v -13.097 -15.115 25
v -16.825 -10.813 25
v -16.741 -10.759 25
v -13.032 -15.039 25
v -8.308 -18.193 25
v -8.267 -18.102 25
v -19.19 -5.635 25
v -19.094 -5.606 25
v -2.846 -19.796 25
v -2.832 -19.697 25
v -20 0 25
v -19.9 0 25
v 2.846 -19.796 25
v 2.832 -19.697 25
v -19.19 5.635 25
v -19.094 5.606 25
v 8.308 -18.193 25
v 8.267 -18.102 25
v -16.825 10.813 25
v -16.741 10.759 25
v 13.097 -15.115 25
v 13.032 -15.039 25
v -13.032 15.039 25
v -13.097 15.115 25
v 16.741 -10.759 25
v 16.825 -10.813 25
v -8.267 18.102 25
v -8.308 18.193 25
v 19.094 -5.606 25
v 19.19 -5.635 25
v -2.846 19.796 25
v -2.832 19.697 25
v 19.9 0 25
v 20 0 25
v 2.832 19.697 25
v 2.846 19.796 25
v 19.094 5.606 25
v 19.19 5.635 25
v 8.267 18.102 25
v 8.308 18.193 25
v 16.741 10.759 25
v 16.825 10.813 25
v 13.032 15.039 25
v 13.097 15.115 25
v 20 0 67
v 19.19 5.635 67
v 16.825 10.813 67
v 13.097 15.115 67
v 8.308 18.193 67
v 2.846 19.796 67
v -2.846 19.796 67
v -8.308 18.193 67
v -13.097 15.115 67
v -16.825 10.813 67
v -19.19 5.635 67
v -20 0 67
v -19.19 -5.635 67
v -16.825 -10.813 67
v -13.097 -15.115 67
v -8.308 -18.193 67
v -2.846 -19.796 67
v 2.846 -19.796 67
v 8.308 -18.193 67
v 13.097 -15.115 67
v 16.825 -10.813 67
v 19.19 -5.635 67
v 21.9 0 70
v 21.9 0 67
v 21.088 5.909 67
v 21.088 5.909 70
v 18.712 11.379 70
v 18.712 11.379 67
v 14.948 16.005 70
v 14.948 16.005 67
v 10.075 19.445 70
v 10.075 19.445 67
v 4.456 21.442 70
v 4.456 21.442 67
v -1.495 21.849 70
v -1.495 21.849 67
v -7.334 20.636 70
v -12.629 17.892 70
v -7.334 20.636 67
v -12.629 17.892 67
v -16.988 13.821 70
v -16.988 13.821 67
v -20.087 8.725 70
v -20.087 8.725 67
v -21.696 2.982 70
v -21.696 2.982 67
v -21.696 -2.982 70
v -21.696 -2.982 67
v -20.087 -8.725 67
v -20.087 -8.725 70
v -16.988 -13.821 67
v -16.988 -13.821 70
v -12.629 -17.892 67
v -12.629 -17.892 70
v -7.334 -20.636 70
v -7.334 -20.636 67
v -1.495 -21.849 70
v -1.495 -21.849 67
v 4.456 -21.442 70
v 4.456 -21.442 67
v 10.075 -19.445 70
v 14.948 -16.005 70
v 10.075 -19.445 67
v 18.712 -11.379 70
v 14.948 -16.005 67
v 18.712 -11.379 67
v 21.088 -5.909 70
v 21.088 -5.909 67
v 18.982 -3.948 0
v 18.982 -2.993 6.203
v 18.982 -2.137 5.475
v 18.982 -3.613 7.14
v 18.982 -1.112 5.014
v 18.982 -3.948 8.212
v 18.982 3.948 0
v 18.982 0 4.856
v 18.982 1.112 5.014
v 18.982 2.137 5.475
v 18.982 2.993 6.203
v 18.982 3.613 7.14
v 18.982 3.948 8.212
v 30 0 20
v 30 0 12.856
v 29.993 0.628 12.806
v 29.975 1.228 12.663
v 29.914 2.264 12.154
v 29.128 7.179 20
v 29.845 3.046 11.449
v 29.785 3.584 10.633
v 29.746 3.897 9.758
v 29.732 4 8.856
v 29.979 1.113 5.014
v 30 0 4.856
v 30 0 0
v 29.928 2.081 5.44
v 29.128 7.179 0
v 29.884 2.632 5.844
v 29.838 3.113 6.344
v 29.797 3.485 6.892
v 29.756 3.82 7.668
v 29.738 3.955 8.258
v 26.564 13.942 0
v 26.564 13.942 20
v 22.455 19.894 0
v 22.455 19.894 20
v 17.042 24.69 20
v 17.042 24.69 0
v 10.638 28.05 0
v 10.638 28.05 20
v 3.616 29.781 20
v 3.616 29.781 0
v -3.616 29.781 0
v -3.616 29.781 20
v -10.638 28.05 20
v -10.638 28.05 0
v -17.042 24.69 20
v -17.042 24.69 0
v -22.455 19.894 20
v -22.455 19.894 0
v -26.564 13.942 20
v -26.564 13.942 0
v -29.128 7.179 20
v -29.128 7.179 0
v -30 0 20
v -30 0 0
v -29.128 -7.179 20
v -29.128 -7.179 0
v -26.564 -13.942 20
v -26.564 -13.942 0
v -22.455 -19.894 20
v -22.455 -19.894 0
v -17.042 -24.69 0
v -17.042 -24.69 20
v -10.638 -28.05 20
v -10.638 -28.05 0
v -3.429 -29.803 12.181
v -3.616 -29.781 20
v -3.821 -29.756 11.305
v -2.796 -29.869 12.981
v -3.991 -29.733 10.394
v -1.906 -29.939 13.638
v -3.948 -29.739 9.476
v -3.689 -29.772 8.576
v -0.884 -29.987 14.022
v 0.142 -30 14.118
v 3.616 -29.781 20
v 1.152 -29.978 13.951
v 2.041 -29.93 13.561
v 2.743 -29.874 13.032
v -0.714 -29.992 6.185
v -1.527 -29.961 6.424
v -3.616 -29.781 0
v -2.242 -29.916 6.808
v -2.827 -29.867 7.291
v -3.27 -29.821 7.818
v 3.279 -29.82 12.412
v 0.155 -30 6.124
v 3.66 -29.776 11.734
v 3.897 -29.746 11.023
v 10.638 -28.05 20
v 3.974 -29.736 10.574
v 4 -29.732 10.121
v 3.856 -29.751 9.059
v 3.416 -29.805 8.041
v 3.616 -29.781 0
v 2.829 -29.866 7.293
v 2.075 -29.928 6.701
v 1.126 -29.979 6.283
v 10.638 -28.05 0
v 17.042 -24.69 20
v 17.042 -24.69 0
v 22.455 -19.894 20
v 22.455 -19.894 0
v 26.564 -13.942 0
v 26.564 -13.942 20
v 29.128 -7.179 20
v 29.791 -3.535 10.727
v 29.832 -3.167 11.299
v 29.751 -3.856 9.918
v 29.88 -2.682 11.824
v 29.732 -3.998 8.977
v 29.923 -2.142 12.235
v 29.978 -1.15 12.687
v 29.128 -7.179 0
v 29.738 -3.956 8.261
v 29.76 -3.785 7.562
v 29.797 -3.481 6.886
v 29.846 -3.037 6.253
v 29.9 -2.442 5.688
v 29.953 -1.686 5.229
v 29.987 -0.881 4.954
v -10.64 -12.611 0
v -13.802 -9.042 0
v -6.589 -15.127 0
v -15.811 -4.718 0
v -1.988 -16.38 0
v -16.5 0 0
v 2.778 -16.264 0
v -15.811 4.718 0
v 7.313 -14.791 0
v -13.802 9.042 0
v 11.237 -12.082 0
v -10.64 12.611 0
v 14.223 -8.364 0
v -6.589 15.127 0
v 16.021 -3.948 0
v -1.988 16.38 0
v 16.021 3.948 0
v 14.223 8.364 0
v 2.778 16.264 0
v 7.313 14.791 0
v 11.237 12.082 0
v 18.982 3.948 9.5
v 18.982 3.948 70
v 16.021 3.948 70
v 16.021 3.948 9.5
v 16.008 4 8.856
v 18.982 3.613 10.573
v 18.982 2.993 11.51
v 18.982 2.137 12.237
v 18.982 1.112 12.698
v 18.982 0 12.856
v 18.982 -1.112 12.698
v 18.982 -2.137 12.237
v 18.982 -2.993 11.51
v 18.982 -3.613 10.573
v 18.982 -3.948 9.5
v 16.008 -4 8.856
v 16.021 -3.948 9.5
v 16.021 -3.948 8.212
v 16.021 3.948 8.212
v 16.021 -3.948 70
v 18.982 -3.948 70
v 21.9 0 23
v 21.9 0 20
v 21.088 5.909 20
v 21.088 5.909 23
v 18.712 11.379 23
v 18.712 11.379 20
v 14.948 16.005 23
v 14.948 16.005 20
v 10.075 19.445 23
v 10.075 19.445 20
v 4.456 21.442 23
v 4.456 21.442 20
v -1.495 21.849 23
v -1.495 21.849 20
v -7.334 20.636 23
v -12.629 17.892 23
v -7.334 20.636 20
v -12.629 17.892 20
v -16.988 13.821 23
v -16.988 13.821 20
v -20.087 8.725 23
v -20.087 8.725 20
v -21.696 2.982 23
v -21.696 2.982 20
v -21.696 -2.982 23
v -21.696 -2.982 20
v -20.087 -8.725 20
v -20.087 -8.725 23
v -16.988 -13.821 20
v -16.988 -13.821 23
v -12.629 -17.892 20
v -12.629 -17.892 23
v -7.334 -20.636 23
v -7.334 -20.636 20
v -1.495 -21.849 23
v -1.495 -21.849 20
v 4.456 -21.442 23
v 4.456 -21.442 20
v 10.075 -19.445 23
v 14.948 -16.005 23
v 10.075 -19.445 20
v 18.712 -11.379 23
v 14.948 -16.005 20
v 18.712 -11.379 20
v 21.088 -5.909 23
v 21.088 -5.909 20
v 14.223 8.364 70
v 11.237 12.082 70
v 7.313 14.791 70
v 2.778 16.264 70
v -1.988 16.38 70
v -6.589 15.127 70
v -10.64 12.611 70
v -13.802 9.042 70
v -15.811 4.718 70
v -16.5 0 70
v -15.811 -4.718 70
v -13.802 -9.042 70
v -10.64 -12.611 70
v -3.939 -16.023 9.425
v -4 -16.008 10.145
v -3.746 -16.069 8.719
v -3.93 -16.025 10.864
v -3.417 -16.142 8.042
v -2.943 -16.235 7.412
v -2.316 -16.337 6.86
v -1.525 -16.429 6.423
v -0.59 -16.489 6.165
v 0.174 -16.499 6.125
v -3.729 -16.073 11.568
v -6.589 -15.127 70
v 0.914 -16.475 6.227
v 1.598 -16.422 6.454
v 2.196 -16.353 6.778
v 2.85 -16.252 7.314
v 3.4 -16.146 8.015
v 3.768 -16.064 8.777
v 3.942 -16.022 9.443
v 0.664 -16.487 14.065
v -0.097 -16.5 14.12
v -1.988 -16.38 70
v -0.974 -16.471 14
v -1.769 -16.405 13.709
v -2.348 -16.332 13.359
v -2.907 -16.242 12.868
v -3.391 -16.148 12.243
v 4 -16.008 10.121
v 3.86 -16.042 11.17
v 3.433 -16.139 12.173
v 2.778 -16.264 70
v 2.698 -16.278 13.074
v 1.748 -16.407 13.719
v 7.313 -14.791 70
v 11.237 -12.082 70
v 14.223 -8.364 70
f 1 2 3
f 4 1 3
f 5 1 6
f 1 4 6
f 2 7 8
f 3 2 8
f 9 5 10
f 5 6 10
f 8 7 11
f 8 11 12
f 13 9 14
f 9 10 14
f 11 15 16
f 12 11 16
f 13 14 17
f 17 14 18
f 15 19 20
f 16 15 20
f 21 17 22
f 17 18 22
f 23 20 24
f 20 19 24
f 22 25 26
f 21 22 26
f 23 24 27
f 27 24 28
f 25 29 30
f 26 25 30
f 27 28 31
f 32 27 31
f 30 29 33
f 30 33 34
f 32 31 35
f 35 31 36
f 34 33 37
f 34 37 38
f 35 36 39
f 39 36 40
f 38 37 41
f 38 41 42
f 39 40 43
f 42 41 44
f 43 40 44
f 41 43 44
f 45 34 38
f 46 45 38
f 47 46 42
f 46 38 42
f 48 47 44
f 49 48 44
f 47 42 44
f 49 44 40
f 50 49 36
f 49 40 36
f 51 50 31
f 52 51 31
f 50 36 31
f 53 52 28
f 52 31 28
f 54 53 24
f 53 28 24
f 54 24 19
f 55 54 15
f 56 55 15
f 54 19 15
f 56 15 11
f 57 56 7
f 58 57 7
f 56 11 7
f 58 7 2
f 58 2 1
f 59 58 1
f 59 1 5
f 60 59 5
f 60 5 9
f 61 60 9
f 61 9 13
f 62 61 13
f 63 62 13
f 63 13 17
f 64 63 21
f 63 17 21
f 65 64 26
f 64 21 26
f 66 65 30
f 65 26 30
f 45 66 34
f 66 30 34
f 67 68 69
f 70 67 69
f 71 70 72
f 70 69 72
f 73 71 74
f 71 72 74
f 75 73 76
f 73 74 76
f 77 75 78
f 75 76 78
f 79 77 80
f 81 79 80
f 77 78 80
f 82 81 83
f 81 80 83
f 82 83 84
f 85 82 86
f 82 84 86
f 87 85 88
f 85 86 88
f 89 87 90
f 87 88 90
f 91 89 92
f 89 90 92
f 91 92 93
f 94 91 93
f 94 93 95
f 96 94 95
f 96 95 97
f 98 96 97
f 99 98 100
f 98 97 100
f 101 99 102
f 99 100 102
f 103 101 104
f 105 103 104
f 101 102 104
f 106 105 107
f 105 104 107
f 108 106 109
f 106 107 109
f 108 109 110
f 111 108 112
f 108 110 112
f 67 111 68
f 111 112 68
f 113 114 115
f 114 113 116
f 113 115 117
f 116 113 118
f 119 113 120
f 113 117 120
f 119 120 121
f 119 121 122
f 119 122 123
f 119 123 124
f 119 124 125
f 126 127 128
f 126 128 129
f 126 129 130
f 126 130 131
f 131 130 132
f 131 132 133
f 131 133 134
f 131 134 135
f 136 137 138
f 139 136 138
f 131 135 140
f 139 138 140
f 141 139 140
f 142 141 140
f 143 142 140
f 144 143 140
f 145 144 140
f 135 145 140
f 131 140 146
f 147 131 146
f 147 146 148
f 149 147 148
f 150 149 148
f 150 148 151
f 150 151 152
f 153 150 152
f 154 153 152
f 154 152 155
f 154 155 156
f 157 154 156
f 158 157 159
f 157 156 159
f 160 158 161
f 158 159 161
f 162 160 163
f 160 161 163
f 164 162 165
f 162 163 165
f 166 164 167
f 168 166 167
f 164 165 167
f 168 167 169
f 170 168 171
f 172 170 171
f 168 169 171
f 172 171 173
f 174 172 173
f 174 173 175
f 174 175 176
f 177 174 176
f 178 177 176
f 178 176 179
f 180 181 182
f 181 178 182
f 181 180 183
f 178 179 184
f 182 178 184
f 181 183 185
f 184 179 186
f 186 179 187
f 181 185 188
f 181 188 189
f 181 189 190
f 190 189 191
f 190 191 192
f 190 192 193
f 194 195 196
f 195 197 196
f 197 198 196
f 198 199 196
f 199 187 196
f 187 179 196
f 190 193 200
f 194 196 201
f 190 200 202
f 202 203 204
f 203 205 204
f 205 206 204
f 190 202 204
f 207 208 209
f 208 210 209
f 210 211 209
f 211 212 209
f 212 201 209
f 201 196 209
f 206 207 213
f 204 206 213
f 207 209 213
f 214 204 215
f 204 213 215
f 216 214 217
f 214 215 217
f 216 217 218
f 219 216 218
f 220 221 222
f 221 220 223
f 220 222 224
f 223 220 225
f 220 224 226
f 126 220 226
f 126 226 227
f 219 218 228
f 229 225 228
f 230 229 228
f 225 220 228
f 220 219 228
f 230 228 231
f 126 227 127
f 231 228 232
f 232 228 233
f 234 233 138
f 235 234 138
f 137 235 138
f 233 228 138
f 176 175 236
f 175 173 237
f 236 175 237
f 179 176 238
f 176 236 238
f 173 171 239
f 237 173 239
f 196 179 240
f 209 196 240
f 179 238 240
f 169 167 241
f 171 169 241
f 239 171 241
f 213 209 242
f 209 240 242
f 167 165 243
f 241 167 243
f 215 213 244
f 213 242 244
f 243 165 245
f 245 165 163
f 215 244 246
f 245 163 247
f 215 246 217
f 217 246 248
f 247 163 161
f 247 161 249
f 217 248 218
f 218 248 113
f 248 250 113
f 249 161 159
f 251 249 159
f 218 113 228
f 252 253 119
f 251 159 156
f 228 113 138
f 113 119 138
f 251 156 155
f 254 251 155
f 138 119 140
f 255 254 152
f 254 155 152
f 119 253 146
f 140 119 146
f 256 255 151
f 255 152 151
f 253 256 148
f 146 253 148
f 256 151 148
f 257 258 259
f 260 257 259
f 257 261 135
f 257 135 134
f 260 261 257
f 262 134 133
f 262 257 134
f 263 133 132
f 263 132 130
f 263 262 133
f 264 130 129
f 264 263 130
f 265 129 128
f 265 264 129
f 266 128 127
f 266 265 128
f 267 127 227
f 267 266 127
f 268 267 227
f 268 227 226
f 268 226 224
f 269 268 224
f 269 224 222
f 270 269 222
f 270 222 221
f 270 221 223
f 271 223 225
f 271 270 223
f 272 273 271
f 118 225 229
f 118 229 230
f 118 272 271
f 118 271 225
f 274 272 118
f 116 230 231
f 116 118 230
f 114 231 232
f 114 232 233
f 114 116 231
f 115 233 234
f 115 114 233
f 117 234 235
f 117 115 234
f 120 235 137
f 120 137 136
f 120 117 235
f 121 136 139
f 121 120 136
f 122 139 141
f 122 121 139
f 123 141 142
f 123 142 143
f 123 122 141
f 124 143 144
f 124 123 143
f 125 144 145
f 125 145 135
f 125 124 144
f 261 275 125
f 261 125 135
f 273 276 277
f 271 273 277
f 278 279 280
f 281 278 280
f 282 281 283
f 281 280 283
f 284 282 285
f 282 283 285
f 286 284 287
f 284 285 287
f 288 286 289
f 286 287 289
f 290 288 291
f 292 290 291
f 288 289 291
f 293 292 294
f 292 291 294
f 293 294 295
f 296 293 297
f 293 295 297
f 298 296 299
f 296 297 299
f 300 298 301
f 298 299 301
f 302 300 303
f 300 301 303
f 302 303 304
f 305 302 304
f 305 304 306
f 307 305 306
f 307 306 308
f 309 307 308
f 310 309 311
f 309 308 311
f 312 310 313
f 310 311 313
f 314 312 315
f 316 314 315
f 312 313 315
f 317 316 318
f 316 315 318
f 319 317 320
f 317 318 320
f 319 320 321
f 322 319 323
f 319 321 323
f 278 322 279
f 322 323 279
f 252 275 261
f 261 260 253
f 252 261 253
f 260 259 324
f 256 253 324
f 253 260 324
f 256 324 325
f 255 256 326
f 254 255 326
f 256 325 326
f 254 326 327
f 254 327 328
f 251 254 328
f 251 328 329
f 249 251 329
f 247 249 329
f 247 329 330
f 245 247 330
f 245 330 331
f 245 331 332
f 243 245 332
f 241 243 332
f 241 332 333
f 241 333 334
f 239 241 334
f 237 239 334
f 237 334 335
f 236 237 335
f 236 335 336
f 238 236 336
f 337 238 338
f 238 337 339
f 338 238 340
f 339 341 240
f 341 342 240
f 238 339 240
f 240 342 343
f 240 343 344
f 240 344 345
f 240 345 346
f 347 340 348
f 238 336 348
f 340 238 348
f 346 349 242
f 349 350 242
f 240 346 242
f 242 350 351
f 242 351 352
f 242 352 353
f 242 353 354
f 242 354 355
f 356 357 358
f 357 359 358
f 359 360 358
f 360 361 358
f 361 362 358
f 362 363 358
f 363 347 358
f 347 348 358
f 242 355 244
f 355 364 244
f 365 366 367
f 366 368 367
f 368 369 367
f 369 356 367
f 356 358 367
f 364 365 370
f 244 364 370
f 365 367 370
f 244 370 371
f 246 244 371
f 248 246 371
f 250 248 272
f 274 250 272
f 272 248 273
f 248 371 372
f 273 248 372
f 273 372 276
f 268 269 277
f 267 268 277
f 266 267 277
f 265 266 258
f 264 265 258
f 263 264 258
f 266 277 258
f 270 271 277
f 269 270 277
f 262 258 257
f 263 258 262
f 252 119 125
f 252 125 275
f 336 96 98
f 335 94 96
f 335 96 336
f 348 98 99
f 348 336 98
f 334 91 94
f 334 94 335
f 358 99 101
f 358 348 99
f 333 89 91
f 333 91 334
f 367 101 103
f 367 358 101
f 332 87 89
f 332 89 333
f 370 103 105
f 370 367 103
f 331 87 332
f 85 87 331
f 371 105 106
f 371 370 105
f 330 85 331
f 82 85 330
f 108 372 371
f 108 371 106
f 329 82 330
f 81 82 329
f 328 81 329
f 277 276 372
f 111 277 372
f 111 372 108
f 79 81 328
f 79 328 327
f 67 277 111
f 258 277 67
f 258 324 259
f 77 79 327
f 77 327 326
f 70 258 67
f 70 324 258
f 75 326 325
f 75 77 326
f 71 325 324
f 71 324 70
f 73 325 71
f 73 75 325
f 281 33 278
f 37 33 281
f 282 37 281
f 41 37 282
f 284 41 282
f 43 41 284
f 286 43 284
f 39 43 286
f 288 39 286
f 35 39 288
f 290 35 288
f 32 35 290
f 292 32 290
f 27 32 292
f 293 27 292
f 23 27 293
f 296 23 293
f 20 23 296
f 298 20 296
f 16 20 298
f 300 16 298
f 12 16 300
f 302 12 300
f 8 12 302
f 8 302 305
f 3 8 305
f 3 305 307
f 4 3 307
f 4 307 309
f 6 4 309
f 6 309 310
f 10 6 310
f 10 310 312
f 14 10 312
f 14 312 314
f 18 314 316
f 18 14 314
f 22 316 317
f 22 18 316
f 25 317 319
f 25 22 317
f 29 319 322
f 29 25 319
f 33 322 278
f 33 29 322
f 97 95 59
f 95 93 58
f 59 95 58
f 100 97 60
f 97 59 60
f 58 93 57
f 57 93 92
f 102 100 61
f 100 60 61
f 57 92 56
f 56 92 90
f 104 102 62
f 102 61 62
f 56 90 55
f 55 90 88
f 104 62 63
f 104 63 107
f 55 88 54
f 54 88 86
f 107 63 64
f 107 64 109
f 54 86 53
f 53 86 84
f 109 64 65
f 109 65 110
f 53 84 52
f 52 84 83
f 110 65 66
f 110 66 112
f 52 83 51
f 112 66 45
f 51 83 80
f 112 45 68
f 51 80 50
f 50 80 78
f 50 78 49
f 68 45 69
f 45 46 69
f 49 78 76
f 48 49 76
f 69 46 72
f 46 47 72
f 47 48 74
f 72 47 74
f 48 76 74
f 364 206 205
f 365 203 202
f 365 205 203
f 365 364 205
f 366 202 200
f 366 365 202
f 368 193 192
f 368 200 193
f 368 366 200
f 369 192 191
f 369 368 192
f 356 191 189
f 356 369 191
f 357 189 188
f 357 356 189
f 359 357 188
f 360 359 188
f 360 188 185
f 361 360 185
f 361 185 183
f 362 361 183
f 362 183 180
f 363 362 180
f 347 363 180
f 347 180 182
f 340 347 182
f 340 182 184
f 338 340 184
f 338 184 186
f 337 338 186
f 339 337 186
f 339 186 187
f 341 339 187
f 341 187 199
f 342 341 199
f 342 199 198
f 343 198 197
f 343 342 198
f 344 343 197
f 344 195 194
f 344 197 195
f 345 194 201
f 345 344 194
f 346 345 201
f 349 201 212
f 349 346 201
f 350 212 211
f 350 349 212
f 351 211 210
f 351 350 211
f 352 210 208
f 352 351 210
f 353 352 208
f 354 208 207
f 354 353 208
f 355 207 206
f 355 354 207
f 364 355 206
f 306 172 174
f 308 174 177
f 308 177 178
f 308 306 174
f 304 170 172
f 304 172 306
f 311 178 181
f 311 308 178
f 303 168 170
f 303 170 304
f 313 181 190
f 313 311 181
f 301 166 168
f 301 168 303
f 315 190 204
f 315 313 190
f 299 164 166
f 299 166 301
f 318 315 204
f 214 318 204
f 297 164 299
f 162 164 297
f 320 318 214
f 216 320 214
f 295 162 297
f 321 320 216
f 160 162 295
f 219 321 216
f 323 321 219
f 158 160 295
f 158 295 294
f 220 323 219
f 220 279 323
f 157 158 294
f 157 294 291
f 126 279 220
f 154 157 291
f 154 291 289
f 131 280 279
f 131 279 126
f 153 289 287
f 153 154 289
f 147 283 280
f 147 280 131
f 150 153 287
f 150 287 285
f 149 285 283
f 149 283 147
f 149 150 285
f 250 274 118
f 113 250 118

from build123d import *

# Parameters (mm, degrees)
F0_R      = 30
F1_DEPTH  = 20
F2_R      = 4
F3_DEPTH  = 30
F4_R      = 21.9
F5_DEPTH  = 5
F6_SIZE   = 2
F7_R      = 20
F7_R_2    = 19.9
F8_DEPTH  = 42
F9_R      = 21.9
F9_R_2    = 20
F10_DEPTH = 3
F12_DEPTH = 70
F13_R     = 4
F14_DEPTH = 30.0010001


with BuildPart() as f1:
    # F0 (on Top) → F1 (new body)
    with BuildSketch(Plane.XY):
        Circle(F0_R)
    extrude(amount=F1_DEPTH)

    # F2 (on Front) → F3 (cut)
    with BuildSketch(Plane.XZ):
        with Locations((0, 10.1209855556)):
            Circle(F2_R)
    extrude(amount=F3_DEPTH, mode=Mode.SUBTRACT)

    # F4 (on face) → F5 (join)
    with BuildSketch(Plane.XY.offset(20)):
        Circle(F4_R)
    extrude(amount=F5_DEPTH)

    # F6
    f6_edges = [f1.edges().sort_by_distance(p)[0] for p in [
        (-21.9, 0, 25),
    ]]
    chamfer(f6_edges, length=F6_SIZE)

    # F7 (on face) → F8 (join)
    with BuildSketch(Plane.XY.offset(25)):
        Circle(F7_R)
        Circle(F7_R_2, mode=Mode.SUBTRACT)
        Circle(F7_R_2)
    extrude(amount=F8_DEPTH)

    # F9 (on face) → F10 (join)
    with BuildSketch(Plane.XY.offset(67)):
        Circle(F9_R)
        Circle(F9_R_2, mode=Mode.SUBTRACT)
        Circle(F9_R_2)
    extrude(amount=F10_DEPTH)

    # F11 (on face) → F12 (cut)
    with BuildSketch(Plane.XY.offset(70)):
        with BuildLine():
            Line((18.9816207227, 3.9478135966), (16.0207605252, 3.9478135966))
            ThreePointArc((16.0207605252, 3.9478135966), (-16.5, 0), (16.0207605252, -3.9478135966))
            Line((16.0207605252, -3.9478135966), (18.9816207227, -3.9478135966))
            Line((18.9816207227, -3.9478135966), (18.9816207227, 3.9478135966))
        make_face()
    extrude(amount=-F12_DEPTH, mode=Mode.SUBTRACT)

    # F13 (on Right) → F14 (cut, through all)
    with BuildSketch(Plane.YZ):
        with Locations((0, 8.8561634937)):
            Circle(F13_R)
    extrude(amount=F14_DEPTH, mode=Mode.SUBTRACT)


solid = f1.part
